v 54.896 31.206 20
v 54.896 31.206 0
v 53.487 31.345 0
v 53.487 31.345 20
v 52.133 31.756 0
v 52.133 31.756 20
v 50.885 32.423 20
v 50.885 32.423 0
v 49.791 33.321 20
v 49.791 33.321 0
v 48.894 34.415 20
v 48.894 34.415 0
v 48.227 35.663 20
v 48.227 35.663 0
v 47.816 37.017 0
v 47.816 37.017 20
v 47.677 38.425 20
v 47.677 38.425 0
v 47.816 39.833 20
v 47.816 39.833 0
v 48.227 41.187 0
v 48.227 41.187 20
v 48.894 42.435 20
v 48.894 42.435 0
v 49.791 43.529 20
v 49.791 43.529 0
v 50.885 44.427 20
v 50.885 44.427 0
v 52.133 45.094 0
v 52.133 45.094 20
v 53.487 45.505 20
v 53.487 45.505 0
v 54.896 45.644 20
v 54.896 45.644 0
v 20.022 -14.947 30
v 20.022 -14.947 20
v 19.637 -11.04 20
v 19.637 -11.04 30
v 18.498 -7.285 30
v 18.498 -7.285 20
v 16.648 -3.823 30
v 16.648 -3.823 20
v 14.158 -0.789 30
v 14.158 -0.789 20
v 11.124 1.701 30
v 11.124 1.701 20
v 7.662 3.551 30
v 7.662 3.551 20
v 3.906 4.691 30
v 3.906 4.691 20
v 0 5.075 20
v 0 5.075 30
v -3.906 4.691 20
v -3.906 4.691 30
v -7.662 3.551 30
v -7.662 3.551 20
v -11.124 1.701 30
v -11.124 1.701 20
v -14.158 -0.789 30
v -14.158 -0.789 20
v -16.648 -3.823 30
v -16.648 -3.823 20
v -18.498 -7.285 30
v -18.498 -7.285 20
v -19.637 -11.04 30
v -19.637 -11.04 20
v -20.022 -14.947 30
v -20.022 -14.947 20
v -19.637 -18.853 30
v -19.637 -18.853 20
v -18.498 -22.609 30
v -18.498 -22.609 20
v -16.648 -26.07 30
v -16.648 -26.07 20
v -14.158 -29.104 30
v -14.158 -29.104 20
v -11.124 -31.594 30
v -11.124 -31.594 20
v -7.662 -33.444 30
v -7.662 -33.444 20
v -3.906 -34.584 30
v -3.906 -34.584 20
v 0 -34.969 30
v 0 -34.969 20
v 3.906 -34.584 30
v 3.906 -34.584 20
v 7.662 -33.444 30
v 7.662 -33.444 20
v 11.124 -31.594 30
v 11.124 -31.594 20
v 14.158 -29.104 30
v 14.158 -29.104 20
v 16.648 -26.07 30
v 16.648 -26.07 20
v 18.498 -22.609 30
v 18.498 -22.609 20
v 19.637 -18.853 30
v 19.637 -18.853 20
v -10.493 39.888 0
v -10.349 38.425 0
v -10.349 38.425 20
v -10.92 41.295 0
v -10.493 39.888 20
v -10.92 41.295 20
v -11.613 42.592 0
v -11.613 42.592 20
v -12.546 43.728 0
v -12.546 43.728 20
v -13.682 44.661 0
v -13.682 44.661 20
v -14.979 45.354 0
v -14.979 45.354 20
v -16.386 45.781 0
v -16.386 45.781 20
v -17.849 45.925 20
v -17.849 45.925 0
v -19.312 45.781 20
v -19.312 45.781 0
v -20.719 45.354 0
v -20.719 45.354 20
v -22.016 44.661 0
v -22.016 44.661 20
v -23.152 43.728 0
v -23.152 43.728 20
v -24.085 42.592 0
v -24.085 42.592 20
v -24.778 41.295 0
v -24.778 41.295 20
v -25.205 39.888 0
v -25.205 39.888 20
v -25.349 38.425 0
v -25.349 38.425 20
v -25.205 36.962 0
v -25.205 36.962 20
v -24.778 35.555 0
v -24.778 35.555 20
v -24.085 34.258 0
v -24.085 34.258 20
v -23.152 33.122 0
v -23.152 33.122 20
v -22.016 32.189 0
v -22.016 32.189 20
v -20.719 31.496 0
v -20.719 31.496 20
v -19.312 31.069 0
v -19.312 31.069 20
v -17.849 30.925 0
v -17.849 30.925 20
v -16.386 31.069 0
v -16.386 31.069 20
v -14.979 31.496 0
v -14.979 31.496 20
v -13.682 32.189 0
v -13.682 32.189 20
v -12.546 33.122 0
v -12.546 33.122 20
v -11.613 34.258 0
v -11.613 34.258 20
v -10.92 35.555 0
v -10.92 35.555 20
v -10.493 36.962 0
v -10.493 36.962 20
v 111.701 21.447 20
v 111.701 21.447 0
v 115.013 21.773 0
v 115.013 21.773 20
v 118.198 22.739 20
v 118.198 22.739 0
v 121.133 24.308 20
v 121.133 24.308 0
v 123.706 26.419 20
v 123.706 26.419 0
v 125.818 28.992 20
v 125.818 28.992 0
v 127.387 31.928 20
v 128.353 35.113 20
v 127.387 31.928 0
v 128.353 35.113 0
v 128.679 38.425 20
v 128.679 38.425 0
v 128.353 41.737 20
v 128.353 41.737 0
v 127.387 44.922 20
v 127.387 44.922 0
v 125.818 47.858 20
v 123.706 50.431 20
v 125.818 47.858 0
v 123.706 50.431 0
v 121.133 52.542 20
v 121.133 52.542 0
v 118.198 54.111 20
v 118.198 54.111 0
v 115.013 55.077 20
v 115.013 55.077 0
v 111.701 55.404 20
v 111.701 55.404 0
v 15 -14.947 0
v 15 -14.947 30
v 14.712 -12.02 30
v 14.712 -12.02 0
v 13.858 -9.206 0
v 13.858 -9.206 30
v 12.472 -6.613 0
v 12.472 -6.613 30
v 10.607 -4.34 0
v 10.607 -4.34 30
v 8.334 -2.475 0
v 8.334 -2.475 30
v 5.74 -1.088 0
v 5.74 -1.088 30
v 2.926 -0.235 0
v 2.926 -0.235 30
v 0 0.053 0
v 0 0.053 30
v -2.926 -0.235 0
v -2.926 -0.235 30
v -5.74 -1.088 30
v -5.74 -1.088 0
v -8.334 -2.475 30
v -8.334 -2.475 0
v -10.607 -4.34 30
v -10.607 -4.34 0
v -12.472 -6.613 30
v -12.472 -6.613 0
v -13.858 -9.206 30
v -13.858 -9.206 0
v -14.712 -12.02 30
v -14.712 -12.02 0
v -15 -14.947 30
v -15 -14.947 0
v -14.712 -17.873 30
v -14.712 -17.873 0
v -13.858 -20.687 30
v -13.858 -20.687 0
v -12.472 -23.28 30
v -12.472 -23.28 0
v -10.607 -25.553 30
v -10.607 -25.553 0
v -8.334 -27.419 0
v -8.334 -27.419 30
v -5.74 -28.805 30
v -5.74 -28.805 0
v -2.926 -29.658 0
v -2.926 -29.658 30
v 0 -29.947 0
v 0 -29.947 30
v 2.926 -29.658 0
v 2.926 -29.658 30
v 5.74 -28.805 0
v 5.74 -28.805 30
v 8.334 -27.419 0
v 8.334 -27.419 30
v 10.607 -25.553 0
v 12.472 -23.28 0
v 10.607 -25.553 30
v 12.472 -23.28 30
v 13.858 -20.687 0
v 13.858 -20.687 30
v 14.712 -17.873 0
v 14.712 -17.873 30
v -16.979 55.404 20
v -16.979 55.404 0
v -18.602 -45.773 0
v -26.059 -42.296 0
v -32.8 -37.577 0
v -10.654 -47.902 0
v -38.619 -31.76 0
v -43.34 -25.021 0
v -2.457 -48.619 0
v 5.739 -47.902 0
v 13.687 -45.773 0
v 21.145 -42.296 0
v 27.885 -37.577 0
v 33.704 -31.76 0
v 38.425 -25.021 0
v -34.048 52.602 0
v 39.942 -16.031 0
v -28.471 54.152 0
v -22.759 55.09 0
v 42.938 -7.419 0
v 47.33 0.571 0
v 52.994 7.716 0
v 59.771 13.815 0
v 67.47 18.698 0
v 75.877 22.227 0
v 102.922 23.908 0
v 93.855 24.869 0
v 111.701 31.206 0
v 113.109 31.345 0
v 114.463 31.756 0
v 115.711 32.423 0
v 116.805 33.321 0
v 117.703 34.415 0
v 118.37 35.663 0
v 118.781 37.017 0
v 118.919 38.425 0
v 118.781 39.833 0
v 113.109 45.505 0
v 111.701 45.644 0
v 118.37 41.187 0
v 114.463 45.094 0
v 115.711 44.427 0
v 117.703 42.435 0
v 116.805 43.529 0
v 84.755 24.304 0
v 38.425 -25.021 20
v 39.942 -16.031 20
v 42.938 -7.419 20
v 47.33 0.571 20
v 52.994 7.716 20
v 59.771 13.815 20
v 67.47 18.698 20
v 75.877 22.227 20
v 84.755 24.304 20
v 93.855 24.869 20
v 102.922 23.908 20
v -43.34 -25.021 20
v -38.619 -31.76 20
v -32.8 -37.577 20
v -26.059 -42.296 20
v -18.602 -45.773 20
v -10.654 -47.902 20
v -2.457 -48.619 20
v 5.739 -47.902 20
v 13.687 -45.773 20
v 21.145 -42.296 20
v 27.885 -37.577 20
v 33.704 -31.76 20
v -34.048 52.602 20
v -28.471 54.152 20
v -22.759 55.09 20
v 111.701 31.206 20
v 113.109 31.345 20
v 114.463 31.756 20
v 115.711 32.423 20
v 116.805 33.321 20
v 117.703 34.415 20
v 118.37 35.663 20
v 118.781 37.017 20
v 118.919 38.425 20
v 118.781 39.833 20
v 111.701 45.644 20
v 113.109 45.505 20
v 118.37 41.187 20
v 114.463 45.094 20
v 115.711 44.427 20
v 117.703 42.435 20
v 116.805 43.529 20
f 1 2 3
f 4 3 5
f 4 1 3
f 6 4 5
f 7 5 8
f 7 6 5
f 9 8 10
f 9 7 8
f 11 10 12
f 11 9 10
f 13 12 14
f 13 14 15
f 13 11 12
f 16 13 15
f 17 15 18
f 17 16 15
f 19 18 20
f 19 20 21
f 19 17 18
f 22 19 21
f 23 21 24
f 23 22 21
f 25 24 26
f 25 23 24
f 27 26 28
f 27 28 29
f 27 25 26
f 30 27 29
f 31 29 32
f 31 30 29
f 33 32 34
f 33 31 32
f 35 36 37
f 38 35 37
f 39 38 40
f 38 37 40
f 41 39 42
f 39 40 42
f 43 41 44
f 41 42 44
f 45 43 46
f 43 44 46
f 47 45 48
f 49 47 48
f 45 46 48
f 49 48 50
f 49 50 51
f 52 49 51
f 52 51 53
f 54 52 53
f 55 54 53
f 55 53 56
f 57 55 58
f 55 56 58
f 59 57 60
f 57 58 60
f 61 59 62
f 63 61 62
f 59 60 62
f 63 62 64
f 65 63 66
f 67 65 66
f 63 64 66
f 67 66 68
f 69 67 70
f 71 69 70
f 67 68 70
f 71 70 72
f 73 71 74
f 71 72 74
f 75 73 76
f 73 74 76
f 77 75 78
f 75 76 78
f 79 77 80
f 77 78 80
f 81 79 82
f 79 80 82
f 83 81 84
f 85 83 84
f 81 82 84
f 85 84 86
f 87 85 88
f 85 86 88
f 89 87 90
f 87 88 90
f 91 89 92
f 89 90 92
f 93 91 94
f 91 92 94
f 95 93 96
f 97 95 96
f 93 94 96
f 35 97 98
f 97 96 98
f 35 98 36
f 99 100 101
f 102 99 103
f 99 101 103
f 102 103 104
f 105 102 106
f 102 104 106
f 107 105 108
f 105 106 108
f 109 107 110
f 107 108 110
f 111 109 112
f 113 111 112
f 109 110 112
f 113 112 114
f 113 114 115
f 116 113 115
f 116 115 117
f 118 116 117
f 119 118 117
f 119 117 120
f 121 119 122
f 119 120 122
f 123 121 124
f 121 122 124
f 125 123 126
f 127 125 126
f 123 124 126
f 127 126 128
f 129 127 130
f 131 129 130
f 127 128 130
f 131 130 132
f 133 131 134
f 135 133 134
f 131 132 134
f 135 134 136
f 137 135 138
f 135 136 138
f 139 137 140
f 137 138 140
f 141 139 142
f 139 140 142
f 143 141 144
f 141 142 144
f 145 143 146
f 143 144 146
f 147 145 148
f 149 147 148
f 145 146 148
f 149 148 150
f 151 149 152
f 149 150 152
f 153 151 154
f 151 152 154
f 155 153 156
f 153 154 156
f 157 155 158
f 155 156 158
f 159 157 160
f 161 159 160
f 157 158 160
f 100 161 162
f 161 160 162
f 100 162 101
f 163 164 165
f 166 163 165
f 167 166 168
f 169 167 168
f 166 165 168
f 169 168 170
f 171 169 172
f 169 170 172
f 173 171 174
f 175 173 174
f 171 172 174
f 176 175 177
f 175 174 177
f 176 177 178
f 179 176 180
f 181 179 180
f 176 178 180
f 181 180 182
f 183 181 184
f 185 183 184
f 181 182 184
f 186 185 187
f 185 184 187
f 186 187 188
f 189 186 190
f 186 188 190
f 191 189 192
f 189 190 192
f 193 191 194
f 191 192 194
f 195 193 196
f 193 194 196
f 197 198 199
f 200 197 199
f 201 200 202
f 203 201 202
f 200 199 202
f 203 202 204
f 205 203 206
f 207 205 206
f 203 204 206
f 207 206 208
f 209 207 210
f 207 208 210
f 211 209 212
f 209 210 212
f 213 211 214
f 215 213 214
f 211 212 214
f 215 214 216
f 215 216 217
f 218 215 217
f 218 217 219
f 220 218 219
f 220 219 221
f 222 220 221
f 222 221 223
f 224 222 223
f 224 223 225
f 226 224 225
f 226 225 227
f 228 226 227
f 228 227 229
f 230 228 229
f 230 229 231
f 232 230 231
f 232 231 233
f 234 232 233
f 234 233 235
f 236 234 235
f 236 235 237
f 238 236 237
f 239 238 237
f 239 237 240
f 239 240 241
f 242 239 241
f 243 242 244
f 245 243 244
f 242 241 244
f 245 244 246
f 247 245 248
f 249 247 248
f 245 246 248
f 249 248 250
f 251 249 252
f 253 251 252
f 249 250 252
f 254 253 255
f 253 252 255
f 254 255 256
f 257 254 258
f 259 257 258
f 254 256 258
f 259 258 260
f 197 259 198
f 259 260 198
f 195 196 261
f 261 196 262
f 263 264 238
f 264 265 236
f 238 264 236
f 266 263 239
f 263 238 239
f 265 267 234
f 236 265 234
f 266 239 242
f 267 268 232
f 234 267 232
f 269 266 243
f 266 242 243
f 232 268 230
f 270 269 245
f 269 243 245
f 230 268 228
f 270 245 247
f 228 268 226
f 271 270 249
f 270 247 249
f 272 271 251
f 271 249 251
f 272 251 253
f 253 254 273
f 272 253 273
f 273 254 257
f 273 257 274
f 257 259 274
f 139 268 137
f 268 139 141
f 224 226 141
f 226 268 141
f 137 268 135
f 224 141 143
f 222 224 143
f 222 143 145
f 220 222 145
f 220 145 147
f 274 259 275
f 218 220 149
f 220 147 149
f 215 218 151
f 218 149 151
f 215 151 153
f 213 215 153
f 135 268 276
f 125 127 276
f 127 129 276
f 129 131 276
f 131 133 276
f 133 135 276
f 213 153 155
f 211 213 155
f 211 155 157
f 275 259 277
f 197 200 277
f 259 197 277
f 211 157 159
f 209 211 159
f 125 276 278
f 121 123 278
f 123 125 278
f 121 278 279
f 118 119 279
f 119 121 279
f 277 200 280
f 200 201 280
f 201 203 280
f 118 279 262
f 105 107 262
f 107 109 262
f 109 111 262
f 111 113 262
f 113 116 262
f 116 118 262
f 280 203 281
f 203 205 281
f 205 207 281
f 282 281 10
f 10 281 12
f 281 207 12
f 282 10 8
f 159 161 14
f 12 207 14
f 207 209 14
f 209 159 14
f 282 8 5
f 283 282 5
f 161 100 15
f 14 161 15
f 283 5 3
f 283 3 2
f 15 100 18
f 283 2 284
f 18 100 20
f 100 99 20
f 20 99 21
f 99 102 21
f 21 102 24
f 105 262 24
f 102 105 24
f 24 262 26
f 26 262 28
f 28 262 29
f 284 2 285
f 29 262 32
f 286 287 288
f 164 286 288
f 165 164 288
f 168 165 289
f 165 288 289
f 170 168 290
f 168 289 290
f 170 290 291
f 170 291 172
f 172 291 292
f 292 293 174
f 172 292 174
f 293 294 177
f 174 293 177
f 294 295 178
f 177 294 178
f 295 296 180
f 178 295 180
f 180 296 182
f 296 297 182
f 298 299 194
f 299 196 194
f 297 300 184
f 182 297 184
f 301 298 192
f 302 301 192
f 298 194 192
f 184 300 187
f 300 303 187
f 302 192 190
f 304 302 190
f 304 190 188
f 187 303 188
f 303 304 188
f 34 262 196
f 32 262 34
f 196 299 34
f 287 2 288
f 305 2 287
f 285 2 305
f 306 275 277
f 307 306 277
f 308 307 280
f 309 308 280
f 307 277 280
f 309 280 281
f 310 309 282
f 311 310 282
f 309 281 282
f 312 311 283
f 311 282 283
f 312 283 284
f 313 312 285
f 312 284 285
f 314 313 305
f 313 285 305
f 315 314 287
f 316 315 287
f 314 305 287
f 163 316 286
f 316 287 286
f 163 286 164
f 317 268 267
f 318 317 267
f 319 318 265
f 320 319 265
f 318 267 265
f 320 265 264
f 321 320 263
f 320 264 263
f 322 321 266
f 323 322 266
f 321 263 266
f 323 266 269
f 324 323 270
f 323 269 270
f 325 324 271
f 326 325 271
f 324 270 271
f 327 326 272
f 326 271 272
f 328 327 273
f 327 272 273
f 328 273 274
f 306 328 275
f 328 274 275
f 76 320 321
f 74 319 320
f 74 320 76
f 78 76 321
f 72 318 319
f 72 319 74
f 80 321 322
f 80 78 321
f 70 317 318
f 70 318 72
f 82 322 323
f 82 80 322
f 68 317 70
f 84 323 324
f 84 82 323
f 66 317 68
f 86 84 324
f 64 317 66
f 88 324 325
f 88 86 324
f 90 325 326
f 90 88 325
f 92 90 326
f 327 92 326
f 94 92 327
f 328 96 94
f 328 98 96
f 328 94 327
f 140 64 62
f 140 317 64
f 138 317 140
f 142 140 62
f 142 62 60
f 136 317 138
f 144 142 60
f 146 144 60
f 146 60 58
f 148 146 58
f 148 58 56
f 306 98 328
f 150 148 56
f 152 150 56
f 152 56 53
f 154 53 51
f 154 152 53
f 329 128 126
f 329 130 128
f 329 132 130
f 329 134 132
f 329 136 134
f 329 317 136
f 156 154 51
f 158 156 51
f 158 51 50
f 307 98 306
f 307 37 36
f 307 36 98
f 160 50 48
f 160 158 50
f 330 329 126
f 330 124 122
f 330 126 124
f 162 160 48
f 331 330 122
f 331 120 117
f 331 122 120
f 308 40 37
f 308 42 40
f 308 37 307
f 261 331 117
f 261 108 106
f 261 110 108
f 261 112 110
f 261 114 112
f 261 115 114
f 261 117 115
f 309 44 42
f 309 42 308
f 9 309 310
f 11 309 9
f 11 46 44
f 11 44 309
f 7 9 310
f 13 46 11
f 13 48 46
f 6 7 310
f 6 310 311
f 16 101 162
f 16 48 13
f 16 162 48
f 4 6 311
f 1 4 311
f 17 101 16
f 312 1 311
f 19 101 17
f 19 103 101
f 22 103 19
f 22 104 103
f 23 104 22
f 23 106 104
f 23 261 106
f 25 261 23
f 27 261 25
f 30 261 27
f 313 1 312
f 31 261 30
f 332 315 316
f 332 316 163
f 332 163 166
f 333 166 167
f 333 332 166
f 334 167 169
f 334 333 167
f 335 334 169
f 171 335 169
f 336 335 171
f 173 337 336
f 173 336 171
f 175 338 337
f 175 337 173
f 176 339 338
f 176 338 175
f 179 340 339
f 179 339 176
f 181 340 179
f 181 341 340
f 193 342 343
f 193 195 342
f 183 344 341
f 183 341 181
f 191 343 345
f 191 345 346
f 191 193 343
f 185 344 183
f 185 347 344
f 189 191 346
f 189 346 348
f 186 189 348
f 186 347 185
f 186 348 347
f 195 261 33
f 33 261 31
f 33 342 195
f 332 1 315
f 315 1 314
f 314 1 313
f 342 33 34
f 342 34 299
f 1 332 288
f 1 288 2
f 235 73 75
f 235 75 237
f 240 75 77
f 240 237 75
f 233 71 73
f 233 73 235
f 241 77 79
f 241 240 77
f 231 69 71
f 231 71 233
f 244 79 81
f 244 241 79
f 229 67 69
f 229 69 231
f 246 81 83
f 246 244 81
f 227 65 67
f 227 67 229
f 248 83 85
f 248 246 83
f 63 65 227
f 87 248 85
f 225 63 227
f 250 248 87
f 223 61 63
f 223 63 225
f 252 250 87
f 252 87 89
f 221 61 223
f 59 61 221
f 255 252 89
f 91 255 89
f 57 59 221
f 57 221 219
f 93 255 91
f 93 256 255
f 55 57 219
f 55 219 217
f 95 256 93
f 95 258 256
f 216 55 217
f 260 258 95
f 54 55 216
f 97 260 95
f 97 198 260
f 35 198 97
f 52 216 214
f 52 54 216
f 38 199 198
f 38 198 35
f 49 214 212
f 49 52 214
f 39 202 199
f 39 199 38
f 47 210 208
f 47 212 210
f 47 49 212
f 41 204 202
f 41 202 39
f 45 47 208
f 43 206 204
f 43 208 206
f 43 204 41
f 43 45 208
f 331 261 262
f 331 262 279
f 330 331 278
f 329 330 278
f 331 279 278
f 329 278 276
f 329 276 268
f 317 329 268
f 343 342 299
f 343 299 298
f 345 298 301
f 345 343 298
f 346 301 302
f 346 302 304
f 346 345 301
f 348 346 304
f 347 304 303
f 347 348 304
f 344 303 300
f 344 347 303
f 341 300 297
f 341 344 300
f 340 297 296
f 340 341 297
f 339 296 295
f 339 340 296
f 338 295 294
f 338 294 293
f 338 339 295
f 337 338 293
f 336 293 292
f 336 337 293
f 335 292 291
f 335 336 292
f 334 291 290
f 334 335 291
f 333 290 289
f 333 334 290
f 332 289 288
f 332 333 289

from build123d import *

# Parameters (mm, degrees)
BOSS_EXTRUDE2_DEPTH = 20
SKETCH3_R           = 7.5
CUT_EXTRUDE1_DEPTH  = 20
SKETCH4_R           = 20.021959316
BOSS_EXTRUDE3_DEPTH = 10
SKETCH5_R           = 15
CUT_EXTRUDE3_DEPTH  = 40


with BuildPart() as part:
    # Sketch1 → Boss-Extrude2 (new body)
    with BuildSketch(Plane.XY):
        with BuildLine():
            Line((111.70070007, 55.403547234), (-16.978506411, 55.403547234))
            ThreePointArc((-16.978506411, 55.403547234), (-25.627613379, 54.698491332), (-34.048339635, 52.601940713))
            Line((-34.048339635, 52.601940713), (-43.339871627, -25.020956816))
            ThreePointArc((-43.339871627, -25.020956816), (-2.457415402, -48.618782438), (38.425040824, -25.020956816))
            ThreePointArc((38.425040824, -25.020956816), (63.518057264, 16.418071125), (111.70070007, 21.446534413))
            ThreePointArc((111.70070007, 21.446534413), (128.67920648, 38.425040824), (111.70070007, 55.403547234))
        make_face()
    extrude(amount=BOSS_EXTRUDE2_DEPTH)

    # Sketch3 → Cut-Extrude1 (cut)
    with BuildSketch(Plane.XY.offset(20)):
        with Locations((-17.848919817, 38.425040824)):
            Circle(SKETCH3_R)
        with BuildLine():
            Line((54.895644648, 45.643601072), (111.70070007, 45.643601072))
            ThreePointArc((111.70070007, 45.643601072), (118.919260318, 38.425040824), (111.70070007, 31.206480576))
            Line((111.70070007, 31.206480576), (54.895644648, 31.206480576))
            ThreePointArc((54.895644648, 31.206480576), (47.6770844, 38.425040824), (54.895644648, 45.643601072))
        make_face()
    extrude(amount=-CUT_EXTRUDE1_DEPTH, mode=Mode.SUBTRACT)

    # Sketch4 → Boss-Extrude3 (add)
    with BuildSketch(Plane.XY.offset(20)):
        with Locations((0, -14.946583433)):
            Circle(SKETCH4_R)
    extrude(amount=BOSS_EXTRUDE3_DEPTH)

    # Sketch5 → Cut-Extrude3 (cut)
    with BuildSketch(Plane.XY.offset(30)):
        with Locations((0, -14.946583433)):
            Circle(SKETCH5_R)
    extrude(amount=-CUT_EXTRUDE3_DEPTH, mode=Mode.SUBTRACT)


solid = part.part
